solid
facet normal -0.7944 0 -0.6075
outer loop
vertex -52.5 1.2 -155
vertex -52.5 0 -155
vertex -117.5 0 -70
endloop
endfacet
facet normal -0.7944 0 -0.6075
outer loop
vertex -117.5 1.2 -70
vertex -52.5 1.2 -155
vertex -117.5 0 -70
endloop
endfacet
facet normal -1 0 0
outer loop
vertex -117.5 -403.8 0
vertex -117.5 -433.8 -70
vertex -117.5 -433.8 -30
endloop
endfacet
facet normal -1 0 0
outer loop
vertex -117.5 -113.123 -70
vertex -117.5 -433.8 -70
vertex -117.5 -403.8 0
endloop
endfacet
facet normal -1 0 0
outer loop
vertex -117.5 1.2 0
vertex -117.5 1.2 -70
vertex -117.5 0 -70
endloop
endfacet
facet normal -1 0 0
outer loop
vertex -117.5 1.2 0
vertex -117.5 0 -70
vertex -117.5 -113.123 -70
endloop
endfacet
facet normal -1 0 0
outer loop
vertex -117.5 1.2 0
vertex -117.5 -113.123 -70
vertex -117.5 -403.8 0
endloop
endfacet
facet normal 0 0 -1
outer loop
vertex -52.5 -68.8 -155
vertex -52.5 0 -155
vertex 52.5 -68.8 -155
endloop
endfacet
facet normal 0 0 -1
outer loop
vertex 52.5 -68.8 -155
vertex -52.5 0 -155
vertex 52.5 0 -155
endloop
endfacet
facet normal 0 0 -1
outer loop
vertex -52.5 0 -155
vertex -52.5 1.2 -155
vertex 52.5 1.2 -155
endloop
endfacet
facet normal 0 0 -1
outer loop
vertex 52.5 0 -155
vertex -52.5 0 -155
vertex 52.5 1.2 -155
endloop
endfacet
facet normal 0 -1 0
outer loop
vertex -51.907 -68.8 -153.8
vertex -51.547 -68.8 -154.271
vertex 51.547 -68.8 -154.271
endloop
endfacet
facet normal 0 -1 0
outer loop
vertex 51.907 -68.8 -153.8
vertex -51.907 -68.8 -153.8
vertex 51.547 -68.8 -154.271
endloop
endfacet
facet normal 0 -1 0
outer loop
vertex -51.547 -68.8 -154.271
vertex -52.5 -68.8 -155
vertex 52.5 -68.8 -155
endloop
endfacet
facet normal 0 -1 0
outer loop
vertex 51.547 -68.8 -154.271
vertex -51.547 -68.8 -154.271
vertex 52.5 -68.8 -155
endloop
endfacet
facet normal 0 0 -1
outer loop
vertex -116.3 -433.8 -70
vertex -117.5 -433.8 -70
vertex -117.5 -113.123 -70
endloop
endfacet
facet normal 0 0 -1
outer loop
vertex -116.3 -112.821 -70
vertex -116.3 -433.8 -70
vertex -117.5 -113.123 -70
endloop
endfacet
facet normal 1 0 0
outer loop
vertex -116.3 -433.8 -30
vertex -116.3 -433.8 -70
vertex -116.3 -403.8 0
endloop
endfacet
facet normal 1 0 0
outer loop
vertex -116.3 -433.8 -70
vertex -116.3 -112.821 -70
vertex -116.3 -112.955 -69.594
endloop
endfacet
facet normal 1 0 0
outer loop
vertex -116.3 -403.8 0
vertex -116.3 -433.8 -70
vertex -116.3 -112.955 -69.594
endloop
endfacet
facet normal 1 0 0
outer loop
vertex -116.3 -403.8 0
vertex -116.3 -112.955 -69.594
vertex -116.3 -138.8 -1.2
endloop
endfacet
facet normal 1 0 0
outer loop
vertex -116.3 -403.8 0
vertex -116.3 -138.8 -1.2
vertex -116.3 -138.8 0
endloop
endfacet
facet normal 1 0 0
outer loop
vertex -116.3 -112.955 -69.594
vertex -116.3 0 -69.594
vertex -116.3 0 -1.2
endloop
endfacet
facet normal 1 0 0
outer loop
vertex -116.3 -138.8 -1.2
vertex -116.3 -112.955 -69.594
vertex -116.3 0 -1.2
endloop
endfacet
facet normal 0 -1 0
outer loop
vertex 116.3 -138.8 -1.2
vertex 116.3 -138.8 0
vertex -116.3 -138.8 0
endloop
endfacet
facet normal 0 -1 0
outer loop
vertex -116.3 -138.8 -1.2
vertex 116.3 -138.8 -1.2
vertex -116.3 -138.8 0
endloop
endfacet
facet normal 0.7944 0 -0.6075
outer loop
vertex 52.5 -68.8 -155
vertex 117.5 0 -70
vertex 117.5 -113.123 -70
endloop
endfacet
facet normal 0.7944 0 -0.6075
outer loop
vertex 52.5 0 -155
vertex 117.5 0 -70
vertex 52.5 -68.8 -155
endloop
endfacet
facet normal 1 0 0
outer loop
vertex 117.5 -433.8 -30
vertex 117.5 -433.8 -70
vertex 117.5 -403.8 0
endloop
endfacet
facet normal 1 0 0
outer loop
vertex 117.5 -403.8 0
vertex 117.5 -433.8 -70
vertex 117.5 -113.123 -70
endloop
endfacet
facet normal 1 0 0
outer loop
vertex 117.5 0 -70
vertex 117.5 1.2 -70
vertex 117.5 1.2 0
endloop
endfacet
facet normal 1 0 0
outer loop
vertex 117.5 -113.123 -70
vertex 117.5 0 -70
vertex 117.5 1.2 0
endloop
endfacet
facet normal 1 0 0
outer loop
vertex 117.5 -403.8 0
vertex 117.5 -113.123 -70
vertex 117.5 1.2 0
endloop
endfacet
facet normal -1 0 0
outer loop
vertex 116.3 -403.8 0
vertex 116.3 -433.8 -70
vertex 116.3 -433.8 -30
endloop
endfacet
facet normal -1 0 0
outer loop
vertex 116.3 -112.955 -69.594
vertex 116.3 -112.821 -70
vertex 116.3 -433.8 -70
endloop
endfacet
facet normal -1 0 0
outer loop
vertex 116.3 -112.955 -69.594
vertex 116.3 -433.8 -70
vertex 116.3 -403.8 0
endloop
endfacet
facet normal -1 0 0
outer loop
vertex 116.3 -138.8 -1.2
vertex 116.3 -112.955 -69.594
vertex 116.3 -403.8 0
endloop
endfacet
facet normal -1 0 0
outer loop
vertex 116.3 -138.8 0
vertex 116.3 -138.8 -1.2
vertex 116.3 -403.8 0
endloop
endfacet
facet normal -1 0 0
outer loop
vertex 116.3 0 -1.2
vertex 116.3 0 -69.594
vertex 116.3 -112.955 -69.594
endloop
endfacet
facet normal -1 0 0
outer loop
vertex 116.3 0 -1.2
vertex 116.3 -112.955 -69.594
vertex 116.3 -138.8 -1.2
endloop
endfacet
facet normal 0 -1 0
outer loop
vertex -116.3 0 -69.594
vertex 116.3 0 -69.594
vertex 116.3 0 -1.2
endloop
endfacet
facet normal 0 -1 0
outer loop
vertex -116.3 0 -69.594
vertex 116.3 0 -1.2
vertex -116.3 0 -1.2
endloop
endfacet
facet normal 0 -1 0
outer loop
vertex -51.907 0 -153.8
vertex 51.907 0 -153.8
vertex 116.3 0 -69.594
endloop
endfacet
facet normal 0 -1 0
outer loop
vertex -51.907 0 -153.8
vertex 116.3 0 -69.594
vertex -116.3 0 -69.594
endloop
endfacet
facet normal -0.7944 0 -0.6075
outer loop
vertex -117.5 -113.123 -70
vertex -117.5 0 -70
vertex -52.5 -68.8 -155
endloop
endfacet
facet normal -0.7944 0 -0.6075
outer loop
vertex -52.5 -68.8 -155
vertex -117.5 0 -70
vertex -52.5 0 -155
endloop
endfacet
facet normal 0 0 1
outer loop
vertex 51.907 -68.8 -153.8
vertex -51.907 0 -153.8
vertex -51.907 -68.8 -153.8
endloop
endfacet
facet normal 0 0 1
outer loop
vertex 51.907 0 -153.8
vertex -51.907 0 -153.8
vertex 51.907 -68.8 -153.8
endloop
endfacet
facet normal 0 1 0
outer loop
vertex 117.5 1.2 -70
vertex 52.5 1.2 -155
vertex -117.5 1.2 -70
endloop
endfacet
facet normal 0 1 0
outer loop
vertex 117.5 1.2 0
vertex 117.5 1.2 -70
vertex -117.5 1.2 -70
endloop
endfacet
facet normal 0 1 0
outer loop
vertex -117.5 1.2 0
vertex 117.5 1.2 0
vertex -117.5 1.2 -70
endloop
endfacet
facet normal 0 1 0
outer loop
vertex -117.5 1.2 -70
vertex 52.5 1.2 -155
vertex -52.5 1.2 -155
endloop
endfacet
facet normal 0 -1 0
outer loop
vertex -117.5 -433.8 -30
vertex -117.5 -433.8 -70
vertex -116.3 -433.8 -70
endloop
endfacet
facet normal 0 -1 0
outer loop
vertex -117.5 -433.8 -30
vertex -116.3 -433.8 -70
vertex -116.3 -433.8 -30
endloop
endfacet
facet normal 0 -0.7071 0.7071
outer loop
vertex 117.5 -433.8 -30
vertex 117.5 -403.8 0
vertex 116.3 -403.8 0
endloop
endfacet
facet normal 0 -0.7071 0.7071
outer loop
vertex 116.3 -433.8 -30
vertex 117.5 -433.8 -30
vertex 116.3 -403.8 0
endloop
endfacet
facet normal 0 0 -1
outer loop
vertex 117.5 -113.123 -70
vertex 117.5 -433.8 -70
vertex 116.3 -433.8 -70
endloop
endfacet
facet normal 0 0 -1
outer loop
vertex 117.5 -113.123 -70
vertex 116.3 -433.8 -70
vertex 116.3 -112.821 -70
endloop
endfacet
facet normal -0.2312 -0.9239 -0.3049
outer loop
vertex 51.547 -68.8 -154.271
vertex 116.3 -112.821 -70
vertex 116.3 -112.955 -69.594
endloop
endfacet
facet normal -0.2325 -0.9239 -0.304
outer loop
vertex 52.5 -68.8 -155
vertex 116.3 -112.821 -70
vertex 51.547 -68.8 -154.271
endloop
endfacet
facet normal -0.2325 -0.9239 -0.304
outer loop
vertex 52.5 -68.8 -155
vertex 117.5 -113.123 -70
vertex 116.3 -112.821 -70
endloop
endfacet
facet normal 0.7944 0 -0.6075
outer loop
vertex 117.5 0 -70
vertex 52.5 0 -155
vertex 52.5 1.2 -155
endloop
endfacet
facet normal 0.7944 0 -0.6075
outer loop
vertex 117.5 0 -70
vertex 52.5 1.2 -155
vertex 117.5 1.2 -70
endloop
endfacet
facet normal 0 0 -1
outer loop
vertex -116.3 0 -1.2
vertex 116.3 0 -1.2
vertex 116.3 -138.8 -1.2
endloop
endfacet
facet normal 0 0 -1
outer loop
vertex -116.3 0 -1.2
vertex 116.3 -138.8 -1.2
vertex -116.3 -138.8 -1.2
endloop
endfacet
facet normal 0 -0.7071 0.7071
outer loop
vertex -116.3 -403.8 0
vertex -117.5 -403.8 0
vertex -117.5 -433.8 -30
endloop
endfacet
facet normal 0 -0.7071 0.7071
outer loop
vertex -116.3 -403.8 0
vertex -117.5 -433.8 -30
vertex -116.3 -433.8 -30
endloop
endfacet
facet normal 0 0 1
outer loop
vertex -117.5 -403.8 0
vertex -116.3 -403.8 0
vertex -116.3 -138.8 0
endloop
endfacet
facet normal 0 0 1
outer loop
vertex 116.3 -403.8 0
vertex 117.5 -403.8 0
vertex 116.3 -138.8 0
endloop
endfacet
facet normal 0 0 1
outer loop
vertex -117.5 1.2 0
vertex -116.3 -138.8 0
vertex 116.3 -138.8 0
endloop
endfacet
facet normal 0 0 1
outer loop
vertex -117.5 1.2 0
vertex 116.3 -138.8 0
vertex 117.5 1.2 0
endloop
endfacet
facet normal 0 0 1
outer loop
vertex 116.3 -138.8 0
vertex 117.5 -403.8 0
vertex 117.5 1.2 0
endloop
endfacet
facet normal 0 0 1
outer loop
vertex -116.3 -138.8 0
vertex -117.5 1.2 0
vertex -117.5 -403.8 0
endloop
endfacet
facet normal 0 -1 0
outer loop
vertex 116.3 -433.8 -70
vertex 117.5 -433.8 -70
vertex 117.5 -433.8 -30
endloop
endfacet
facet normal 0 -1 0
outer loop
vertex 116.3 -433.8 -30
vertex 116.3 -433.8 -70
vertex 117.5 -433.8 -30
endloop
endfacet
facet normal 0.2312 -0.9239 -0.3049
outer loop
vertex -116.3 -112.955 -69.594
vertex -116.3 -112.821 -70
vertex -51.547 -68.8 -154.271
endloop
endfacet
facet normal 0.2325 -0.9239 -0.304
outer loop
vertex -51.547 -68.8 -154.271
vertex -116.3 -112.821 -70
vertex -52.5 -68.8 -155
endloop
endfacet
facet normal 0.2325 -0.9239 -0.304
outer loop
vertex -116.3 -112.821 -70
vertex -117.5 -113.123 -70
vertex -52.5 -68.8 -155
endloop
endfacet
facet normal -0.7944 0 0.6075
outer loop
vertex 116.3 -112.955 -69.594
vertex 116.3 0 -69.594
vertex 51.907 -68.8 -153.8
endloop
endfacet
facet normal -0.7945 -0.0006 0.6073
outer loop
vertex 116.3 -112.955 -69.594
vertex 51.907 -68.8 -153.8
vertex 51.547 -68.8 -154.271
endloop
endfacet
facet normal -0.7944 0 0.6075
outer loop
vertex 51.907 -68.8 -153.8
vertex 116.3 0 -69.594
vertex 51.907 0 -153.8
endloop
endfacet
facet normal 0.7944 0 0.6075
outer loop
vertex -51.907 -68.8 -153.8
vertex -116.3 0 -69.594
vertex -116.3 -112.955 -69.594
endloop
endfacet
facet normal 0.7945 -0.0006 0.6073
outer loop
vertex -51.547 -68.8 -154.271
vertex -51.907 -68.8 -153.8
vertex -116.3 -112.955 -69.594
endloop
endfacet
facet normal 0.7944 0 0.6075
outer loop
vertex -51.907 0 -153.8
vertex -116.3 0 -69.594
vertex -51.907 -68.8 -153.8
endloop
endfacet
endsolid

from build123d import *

# Parameters (mm, degrees)
BOSS_EXTRUDE1_DEPTH = 1.2
SKETCH2_W           = 70
SKETCH2_H           = 435
BOSS_EXTRUDE2_DEPTH = 1.2
BOSS_EXTRUDE3_DEPTH = 1.2
SKETCH4_W           = 52.5
SKETCH4_H           = 70
BOSS_EXTRUDE4_DEPTH = 1.2
CHAMFER1_SIZE       = 30
SKETCH6_W           = 117.5
SKETCH6_H           = 140
BOSS_EXTRUDE5_DEPTH = 1.2


with BuildPart() as part:
    # Sketch1 → Boss-Extrude1 (new body)
    with BuildSketch(Plane(origin=(0, 0, 0), x_dir=(1, 0, 0), z_dir=(0, 1, 0))):
        Polygon((0, 0), (0, 155), (-52.5, 155), (-117.5, 70), (-117.5, 0), align=None)
    extrude(amount=BOSS_EXTRUDE1_DEPTH)

    # Sketch2 → Boss-Extrude2 (add)
    with BuildSketch(Plane.ZY.offset(117.5)):
        with Locations((-35, -216.3)):
            Rectangle(SKETCH2_W, SKETCH2_H)
    extrude(amount=-BOSS_EXTRUDE2_DEPTH)

    # Sketch3 → Boss-Extrude3 (add)
    with BuildSketch(Plane(origin=(-107.920305677, 0, -82.527292576), x_dir=(-0.607450108, 0, 0.794357833), z_dir=(-0.794357833, 0, -0.607450108))):
        Polygon((-91.234333464, 1.2), (15.770339331, 1.2), (15.770339331, -113.122786709), (-91.234333464, -68.8), align=None)
    extrude(amount=-BOSS_EXTRUDE3_DEPTH)

    # Sketch4 → Boss-Extrude4 (add)
    with BuildSketch(Plane(origin=(0, 0, -155), x_dir=(-1, 0, 0), z_dir=(0, 0, -1))):
        with Locations((26.25, -33.8)):
            Rectangle(SKETCH4_W, SKETCH4_H)
    extrude(amount=-BOSS_EXTRUDE4_DEPTH)

    # Chamfer1
    chamfer1_edges = [part.edges().sort_by_distance(p)[0] for p in [
        (-116.9, -433.8, 0),
    ]]
    chamfer(chamfer1_edges, length=CHAMFER1_SIZE)

    # Sketch6 → Boss-Extrude5 (add)
    with BuildSketch(Plane.XY):
        with Locations((-58.75, -68.8)):
            Rectangle(SKETCH6_W, SKETCH6_H)
    extrude(amount=-BOSS_EXTRUDE5_DEPTH)

    # Mirror1: part across face


with BuildPart() as part_1:
    add(part.part)
    add(part.part.mirror(Plane(origin=(0, -32.836293436, -62.654440154), x_dir=(0, 0, 1), z_dir=(1, 0, 0))))


solid = part_1.part
